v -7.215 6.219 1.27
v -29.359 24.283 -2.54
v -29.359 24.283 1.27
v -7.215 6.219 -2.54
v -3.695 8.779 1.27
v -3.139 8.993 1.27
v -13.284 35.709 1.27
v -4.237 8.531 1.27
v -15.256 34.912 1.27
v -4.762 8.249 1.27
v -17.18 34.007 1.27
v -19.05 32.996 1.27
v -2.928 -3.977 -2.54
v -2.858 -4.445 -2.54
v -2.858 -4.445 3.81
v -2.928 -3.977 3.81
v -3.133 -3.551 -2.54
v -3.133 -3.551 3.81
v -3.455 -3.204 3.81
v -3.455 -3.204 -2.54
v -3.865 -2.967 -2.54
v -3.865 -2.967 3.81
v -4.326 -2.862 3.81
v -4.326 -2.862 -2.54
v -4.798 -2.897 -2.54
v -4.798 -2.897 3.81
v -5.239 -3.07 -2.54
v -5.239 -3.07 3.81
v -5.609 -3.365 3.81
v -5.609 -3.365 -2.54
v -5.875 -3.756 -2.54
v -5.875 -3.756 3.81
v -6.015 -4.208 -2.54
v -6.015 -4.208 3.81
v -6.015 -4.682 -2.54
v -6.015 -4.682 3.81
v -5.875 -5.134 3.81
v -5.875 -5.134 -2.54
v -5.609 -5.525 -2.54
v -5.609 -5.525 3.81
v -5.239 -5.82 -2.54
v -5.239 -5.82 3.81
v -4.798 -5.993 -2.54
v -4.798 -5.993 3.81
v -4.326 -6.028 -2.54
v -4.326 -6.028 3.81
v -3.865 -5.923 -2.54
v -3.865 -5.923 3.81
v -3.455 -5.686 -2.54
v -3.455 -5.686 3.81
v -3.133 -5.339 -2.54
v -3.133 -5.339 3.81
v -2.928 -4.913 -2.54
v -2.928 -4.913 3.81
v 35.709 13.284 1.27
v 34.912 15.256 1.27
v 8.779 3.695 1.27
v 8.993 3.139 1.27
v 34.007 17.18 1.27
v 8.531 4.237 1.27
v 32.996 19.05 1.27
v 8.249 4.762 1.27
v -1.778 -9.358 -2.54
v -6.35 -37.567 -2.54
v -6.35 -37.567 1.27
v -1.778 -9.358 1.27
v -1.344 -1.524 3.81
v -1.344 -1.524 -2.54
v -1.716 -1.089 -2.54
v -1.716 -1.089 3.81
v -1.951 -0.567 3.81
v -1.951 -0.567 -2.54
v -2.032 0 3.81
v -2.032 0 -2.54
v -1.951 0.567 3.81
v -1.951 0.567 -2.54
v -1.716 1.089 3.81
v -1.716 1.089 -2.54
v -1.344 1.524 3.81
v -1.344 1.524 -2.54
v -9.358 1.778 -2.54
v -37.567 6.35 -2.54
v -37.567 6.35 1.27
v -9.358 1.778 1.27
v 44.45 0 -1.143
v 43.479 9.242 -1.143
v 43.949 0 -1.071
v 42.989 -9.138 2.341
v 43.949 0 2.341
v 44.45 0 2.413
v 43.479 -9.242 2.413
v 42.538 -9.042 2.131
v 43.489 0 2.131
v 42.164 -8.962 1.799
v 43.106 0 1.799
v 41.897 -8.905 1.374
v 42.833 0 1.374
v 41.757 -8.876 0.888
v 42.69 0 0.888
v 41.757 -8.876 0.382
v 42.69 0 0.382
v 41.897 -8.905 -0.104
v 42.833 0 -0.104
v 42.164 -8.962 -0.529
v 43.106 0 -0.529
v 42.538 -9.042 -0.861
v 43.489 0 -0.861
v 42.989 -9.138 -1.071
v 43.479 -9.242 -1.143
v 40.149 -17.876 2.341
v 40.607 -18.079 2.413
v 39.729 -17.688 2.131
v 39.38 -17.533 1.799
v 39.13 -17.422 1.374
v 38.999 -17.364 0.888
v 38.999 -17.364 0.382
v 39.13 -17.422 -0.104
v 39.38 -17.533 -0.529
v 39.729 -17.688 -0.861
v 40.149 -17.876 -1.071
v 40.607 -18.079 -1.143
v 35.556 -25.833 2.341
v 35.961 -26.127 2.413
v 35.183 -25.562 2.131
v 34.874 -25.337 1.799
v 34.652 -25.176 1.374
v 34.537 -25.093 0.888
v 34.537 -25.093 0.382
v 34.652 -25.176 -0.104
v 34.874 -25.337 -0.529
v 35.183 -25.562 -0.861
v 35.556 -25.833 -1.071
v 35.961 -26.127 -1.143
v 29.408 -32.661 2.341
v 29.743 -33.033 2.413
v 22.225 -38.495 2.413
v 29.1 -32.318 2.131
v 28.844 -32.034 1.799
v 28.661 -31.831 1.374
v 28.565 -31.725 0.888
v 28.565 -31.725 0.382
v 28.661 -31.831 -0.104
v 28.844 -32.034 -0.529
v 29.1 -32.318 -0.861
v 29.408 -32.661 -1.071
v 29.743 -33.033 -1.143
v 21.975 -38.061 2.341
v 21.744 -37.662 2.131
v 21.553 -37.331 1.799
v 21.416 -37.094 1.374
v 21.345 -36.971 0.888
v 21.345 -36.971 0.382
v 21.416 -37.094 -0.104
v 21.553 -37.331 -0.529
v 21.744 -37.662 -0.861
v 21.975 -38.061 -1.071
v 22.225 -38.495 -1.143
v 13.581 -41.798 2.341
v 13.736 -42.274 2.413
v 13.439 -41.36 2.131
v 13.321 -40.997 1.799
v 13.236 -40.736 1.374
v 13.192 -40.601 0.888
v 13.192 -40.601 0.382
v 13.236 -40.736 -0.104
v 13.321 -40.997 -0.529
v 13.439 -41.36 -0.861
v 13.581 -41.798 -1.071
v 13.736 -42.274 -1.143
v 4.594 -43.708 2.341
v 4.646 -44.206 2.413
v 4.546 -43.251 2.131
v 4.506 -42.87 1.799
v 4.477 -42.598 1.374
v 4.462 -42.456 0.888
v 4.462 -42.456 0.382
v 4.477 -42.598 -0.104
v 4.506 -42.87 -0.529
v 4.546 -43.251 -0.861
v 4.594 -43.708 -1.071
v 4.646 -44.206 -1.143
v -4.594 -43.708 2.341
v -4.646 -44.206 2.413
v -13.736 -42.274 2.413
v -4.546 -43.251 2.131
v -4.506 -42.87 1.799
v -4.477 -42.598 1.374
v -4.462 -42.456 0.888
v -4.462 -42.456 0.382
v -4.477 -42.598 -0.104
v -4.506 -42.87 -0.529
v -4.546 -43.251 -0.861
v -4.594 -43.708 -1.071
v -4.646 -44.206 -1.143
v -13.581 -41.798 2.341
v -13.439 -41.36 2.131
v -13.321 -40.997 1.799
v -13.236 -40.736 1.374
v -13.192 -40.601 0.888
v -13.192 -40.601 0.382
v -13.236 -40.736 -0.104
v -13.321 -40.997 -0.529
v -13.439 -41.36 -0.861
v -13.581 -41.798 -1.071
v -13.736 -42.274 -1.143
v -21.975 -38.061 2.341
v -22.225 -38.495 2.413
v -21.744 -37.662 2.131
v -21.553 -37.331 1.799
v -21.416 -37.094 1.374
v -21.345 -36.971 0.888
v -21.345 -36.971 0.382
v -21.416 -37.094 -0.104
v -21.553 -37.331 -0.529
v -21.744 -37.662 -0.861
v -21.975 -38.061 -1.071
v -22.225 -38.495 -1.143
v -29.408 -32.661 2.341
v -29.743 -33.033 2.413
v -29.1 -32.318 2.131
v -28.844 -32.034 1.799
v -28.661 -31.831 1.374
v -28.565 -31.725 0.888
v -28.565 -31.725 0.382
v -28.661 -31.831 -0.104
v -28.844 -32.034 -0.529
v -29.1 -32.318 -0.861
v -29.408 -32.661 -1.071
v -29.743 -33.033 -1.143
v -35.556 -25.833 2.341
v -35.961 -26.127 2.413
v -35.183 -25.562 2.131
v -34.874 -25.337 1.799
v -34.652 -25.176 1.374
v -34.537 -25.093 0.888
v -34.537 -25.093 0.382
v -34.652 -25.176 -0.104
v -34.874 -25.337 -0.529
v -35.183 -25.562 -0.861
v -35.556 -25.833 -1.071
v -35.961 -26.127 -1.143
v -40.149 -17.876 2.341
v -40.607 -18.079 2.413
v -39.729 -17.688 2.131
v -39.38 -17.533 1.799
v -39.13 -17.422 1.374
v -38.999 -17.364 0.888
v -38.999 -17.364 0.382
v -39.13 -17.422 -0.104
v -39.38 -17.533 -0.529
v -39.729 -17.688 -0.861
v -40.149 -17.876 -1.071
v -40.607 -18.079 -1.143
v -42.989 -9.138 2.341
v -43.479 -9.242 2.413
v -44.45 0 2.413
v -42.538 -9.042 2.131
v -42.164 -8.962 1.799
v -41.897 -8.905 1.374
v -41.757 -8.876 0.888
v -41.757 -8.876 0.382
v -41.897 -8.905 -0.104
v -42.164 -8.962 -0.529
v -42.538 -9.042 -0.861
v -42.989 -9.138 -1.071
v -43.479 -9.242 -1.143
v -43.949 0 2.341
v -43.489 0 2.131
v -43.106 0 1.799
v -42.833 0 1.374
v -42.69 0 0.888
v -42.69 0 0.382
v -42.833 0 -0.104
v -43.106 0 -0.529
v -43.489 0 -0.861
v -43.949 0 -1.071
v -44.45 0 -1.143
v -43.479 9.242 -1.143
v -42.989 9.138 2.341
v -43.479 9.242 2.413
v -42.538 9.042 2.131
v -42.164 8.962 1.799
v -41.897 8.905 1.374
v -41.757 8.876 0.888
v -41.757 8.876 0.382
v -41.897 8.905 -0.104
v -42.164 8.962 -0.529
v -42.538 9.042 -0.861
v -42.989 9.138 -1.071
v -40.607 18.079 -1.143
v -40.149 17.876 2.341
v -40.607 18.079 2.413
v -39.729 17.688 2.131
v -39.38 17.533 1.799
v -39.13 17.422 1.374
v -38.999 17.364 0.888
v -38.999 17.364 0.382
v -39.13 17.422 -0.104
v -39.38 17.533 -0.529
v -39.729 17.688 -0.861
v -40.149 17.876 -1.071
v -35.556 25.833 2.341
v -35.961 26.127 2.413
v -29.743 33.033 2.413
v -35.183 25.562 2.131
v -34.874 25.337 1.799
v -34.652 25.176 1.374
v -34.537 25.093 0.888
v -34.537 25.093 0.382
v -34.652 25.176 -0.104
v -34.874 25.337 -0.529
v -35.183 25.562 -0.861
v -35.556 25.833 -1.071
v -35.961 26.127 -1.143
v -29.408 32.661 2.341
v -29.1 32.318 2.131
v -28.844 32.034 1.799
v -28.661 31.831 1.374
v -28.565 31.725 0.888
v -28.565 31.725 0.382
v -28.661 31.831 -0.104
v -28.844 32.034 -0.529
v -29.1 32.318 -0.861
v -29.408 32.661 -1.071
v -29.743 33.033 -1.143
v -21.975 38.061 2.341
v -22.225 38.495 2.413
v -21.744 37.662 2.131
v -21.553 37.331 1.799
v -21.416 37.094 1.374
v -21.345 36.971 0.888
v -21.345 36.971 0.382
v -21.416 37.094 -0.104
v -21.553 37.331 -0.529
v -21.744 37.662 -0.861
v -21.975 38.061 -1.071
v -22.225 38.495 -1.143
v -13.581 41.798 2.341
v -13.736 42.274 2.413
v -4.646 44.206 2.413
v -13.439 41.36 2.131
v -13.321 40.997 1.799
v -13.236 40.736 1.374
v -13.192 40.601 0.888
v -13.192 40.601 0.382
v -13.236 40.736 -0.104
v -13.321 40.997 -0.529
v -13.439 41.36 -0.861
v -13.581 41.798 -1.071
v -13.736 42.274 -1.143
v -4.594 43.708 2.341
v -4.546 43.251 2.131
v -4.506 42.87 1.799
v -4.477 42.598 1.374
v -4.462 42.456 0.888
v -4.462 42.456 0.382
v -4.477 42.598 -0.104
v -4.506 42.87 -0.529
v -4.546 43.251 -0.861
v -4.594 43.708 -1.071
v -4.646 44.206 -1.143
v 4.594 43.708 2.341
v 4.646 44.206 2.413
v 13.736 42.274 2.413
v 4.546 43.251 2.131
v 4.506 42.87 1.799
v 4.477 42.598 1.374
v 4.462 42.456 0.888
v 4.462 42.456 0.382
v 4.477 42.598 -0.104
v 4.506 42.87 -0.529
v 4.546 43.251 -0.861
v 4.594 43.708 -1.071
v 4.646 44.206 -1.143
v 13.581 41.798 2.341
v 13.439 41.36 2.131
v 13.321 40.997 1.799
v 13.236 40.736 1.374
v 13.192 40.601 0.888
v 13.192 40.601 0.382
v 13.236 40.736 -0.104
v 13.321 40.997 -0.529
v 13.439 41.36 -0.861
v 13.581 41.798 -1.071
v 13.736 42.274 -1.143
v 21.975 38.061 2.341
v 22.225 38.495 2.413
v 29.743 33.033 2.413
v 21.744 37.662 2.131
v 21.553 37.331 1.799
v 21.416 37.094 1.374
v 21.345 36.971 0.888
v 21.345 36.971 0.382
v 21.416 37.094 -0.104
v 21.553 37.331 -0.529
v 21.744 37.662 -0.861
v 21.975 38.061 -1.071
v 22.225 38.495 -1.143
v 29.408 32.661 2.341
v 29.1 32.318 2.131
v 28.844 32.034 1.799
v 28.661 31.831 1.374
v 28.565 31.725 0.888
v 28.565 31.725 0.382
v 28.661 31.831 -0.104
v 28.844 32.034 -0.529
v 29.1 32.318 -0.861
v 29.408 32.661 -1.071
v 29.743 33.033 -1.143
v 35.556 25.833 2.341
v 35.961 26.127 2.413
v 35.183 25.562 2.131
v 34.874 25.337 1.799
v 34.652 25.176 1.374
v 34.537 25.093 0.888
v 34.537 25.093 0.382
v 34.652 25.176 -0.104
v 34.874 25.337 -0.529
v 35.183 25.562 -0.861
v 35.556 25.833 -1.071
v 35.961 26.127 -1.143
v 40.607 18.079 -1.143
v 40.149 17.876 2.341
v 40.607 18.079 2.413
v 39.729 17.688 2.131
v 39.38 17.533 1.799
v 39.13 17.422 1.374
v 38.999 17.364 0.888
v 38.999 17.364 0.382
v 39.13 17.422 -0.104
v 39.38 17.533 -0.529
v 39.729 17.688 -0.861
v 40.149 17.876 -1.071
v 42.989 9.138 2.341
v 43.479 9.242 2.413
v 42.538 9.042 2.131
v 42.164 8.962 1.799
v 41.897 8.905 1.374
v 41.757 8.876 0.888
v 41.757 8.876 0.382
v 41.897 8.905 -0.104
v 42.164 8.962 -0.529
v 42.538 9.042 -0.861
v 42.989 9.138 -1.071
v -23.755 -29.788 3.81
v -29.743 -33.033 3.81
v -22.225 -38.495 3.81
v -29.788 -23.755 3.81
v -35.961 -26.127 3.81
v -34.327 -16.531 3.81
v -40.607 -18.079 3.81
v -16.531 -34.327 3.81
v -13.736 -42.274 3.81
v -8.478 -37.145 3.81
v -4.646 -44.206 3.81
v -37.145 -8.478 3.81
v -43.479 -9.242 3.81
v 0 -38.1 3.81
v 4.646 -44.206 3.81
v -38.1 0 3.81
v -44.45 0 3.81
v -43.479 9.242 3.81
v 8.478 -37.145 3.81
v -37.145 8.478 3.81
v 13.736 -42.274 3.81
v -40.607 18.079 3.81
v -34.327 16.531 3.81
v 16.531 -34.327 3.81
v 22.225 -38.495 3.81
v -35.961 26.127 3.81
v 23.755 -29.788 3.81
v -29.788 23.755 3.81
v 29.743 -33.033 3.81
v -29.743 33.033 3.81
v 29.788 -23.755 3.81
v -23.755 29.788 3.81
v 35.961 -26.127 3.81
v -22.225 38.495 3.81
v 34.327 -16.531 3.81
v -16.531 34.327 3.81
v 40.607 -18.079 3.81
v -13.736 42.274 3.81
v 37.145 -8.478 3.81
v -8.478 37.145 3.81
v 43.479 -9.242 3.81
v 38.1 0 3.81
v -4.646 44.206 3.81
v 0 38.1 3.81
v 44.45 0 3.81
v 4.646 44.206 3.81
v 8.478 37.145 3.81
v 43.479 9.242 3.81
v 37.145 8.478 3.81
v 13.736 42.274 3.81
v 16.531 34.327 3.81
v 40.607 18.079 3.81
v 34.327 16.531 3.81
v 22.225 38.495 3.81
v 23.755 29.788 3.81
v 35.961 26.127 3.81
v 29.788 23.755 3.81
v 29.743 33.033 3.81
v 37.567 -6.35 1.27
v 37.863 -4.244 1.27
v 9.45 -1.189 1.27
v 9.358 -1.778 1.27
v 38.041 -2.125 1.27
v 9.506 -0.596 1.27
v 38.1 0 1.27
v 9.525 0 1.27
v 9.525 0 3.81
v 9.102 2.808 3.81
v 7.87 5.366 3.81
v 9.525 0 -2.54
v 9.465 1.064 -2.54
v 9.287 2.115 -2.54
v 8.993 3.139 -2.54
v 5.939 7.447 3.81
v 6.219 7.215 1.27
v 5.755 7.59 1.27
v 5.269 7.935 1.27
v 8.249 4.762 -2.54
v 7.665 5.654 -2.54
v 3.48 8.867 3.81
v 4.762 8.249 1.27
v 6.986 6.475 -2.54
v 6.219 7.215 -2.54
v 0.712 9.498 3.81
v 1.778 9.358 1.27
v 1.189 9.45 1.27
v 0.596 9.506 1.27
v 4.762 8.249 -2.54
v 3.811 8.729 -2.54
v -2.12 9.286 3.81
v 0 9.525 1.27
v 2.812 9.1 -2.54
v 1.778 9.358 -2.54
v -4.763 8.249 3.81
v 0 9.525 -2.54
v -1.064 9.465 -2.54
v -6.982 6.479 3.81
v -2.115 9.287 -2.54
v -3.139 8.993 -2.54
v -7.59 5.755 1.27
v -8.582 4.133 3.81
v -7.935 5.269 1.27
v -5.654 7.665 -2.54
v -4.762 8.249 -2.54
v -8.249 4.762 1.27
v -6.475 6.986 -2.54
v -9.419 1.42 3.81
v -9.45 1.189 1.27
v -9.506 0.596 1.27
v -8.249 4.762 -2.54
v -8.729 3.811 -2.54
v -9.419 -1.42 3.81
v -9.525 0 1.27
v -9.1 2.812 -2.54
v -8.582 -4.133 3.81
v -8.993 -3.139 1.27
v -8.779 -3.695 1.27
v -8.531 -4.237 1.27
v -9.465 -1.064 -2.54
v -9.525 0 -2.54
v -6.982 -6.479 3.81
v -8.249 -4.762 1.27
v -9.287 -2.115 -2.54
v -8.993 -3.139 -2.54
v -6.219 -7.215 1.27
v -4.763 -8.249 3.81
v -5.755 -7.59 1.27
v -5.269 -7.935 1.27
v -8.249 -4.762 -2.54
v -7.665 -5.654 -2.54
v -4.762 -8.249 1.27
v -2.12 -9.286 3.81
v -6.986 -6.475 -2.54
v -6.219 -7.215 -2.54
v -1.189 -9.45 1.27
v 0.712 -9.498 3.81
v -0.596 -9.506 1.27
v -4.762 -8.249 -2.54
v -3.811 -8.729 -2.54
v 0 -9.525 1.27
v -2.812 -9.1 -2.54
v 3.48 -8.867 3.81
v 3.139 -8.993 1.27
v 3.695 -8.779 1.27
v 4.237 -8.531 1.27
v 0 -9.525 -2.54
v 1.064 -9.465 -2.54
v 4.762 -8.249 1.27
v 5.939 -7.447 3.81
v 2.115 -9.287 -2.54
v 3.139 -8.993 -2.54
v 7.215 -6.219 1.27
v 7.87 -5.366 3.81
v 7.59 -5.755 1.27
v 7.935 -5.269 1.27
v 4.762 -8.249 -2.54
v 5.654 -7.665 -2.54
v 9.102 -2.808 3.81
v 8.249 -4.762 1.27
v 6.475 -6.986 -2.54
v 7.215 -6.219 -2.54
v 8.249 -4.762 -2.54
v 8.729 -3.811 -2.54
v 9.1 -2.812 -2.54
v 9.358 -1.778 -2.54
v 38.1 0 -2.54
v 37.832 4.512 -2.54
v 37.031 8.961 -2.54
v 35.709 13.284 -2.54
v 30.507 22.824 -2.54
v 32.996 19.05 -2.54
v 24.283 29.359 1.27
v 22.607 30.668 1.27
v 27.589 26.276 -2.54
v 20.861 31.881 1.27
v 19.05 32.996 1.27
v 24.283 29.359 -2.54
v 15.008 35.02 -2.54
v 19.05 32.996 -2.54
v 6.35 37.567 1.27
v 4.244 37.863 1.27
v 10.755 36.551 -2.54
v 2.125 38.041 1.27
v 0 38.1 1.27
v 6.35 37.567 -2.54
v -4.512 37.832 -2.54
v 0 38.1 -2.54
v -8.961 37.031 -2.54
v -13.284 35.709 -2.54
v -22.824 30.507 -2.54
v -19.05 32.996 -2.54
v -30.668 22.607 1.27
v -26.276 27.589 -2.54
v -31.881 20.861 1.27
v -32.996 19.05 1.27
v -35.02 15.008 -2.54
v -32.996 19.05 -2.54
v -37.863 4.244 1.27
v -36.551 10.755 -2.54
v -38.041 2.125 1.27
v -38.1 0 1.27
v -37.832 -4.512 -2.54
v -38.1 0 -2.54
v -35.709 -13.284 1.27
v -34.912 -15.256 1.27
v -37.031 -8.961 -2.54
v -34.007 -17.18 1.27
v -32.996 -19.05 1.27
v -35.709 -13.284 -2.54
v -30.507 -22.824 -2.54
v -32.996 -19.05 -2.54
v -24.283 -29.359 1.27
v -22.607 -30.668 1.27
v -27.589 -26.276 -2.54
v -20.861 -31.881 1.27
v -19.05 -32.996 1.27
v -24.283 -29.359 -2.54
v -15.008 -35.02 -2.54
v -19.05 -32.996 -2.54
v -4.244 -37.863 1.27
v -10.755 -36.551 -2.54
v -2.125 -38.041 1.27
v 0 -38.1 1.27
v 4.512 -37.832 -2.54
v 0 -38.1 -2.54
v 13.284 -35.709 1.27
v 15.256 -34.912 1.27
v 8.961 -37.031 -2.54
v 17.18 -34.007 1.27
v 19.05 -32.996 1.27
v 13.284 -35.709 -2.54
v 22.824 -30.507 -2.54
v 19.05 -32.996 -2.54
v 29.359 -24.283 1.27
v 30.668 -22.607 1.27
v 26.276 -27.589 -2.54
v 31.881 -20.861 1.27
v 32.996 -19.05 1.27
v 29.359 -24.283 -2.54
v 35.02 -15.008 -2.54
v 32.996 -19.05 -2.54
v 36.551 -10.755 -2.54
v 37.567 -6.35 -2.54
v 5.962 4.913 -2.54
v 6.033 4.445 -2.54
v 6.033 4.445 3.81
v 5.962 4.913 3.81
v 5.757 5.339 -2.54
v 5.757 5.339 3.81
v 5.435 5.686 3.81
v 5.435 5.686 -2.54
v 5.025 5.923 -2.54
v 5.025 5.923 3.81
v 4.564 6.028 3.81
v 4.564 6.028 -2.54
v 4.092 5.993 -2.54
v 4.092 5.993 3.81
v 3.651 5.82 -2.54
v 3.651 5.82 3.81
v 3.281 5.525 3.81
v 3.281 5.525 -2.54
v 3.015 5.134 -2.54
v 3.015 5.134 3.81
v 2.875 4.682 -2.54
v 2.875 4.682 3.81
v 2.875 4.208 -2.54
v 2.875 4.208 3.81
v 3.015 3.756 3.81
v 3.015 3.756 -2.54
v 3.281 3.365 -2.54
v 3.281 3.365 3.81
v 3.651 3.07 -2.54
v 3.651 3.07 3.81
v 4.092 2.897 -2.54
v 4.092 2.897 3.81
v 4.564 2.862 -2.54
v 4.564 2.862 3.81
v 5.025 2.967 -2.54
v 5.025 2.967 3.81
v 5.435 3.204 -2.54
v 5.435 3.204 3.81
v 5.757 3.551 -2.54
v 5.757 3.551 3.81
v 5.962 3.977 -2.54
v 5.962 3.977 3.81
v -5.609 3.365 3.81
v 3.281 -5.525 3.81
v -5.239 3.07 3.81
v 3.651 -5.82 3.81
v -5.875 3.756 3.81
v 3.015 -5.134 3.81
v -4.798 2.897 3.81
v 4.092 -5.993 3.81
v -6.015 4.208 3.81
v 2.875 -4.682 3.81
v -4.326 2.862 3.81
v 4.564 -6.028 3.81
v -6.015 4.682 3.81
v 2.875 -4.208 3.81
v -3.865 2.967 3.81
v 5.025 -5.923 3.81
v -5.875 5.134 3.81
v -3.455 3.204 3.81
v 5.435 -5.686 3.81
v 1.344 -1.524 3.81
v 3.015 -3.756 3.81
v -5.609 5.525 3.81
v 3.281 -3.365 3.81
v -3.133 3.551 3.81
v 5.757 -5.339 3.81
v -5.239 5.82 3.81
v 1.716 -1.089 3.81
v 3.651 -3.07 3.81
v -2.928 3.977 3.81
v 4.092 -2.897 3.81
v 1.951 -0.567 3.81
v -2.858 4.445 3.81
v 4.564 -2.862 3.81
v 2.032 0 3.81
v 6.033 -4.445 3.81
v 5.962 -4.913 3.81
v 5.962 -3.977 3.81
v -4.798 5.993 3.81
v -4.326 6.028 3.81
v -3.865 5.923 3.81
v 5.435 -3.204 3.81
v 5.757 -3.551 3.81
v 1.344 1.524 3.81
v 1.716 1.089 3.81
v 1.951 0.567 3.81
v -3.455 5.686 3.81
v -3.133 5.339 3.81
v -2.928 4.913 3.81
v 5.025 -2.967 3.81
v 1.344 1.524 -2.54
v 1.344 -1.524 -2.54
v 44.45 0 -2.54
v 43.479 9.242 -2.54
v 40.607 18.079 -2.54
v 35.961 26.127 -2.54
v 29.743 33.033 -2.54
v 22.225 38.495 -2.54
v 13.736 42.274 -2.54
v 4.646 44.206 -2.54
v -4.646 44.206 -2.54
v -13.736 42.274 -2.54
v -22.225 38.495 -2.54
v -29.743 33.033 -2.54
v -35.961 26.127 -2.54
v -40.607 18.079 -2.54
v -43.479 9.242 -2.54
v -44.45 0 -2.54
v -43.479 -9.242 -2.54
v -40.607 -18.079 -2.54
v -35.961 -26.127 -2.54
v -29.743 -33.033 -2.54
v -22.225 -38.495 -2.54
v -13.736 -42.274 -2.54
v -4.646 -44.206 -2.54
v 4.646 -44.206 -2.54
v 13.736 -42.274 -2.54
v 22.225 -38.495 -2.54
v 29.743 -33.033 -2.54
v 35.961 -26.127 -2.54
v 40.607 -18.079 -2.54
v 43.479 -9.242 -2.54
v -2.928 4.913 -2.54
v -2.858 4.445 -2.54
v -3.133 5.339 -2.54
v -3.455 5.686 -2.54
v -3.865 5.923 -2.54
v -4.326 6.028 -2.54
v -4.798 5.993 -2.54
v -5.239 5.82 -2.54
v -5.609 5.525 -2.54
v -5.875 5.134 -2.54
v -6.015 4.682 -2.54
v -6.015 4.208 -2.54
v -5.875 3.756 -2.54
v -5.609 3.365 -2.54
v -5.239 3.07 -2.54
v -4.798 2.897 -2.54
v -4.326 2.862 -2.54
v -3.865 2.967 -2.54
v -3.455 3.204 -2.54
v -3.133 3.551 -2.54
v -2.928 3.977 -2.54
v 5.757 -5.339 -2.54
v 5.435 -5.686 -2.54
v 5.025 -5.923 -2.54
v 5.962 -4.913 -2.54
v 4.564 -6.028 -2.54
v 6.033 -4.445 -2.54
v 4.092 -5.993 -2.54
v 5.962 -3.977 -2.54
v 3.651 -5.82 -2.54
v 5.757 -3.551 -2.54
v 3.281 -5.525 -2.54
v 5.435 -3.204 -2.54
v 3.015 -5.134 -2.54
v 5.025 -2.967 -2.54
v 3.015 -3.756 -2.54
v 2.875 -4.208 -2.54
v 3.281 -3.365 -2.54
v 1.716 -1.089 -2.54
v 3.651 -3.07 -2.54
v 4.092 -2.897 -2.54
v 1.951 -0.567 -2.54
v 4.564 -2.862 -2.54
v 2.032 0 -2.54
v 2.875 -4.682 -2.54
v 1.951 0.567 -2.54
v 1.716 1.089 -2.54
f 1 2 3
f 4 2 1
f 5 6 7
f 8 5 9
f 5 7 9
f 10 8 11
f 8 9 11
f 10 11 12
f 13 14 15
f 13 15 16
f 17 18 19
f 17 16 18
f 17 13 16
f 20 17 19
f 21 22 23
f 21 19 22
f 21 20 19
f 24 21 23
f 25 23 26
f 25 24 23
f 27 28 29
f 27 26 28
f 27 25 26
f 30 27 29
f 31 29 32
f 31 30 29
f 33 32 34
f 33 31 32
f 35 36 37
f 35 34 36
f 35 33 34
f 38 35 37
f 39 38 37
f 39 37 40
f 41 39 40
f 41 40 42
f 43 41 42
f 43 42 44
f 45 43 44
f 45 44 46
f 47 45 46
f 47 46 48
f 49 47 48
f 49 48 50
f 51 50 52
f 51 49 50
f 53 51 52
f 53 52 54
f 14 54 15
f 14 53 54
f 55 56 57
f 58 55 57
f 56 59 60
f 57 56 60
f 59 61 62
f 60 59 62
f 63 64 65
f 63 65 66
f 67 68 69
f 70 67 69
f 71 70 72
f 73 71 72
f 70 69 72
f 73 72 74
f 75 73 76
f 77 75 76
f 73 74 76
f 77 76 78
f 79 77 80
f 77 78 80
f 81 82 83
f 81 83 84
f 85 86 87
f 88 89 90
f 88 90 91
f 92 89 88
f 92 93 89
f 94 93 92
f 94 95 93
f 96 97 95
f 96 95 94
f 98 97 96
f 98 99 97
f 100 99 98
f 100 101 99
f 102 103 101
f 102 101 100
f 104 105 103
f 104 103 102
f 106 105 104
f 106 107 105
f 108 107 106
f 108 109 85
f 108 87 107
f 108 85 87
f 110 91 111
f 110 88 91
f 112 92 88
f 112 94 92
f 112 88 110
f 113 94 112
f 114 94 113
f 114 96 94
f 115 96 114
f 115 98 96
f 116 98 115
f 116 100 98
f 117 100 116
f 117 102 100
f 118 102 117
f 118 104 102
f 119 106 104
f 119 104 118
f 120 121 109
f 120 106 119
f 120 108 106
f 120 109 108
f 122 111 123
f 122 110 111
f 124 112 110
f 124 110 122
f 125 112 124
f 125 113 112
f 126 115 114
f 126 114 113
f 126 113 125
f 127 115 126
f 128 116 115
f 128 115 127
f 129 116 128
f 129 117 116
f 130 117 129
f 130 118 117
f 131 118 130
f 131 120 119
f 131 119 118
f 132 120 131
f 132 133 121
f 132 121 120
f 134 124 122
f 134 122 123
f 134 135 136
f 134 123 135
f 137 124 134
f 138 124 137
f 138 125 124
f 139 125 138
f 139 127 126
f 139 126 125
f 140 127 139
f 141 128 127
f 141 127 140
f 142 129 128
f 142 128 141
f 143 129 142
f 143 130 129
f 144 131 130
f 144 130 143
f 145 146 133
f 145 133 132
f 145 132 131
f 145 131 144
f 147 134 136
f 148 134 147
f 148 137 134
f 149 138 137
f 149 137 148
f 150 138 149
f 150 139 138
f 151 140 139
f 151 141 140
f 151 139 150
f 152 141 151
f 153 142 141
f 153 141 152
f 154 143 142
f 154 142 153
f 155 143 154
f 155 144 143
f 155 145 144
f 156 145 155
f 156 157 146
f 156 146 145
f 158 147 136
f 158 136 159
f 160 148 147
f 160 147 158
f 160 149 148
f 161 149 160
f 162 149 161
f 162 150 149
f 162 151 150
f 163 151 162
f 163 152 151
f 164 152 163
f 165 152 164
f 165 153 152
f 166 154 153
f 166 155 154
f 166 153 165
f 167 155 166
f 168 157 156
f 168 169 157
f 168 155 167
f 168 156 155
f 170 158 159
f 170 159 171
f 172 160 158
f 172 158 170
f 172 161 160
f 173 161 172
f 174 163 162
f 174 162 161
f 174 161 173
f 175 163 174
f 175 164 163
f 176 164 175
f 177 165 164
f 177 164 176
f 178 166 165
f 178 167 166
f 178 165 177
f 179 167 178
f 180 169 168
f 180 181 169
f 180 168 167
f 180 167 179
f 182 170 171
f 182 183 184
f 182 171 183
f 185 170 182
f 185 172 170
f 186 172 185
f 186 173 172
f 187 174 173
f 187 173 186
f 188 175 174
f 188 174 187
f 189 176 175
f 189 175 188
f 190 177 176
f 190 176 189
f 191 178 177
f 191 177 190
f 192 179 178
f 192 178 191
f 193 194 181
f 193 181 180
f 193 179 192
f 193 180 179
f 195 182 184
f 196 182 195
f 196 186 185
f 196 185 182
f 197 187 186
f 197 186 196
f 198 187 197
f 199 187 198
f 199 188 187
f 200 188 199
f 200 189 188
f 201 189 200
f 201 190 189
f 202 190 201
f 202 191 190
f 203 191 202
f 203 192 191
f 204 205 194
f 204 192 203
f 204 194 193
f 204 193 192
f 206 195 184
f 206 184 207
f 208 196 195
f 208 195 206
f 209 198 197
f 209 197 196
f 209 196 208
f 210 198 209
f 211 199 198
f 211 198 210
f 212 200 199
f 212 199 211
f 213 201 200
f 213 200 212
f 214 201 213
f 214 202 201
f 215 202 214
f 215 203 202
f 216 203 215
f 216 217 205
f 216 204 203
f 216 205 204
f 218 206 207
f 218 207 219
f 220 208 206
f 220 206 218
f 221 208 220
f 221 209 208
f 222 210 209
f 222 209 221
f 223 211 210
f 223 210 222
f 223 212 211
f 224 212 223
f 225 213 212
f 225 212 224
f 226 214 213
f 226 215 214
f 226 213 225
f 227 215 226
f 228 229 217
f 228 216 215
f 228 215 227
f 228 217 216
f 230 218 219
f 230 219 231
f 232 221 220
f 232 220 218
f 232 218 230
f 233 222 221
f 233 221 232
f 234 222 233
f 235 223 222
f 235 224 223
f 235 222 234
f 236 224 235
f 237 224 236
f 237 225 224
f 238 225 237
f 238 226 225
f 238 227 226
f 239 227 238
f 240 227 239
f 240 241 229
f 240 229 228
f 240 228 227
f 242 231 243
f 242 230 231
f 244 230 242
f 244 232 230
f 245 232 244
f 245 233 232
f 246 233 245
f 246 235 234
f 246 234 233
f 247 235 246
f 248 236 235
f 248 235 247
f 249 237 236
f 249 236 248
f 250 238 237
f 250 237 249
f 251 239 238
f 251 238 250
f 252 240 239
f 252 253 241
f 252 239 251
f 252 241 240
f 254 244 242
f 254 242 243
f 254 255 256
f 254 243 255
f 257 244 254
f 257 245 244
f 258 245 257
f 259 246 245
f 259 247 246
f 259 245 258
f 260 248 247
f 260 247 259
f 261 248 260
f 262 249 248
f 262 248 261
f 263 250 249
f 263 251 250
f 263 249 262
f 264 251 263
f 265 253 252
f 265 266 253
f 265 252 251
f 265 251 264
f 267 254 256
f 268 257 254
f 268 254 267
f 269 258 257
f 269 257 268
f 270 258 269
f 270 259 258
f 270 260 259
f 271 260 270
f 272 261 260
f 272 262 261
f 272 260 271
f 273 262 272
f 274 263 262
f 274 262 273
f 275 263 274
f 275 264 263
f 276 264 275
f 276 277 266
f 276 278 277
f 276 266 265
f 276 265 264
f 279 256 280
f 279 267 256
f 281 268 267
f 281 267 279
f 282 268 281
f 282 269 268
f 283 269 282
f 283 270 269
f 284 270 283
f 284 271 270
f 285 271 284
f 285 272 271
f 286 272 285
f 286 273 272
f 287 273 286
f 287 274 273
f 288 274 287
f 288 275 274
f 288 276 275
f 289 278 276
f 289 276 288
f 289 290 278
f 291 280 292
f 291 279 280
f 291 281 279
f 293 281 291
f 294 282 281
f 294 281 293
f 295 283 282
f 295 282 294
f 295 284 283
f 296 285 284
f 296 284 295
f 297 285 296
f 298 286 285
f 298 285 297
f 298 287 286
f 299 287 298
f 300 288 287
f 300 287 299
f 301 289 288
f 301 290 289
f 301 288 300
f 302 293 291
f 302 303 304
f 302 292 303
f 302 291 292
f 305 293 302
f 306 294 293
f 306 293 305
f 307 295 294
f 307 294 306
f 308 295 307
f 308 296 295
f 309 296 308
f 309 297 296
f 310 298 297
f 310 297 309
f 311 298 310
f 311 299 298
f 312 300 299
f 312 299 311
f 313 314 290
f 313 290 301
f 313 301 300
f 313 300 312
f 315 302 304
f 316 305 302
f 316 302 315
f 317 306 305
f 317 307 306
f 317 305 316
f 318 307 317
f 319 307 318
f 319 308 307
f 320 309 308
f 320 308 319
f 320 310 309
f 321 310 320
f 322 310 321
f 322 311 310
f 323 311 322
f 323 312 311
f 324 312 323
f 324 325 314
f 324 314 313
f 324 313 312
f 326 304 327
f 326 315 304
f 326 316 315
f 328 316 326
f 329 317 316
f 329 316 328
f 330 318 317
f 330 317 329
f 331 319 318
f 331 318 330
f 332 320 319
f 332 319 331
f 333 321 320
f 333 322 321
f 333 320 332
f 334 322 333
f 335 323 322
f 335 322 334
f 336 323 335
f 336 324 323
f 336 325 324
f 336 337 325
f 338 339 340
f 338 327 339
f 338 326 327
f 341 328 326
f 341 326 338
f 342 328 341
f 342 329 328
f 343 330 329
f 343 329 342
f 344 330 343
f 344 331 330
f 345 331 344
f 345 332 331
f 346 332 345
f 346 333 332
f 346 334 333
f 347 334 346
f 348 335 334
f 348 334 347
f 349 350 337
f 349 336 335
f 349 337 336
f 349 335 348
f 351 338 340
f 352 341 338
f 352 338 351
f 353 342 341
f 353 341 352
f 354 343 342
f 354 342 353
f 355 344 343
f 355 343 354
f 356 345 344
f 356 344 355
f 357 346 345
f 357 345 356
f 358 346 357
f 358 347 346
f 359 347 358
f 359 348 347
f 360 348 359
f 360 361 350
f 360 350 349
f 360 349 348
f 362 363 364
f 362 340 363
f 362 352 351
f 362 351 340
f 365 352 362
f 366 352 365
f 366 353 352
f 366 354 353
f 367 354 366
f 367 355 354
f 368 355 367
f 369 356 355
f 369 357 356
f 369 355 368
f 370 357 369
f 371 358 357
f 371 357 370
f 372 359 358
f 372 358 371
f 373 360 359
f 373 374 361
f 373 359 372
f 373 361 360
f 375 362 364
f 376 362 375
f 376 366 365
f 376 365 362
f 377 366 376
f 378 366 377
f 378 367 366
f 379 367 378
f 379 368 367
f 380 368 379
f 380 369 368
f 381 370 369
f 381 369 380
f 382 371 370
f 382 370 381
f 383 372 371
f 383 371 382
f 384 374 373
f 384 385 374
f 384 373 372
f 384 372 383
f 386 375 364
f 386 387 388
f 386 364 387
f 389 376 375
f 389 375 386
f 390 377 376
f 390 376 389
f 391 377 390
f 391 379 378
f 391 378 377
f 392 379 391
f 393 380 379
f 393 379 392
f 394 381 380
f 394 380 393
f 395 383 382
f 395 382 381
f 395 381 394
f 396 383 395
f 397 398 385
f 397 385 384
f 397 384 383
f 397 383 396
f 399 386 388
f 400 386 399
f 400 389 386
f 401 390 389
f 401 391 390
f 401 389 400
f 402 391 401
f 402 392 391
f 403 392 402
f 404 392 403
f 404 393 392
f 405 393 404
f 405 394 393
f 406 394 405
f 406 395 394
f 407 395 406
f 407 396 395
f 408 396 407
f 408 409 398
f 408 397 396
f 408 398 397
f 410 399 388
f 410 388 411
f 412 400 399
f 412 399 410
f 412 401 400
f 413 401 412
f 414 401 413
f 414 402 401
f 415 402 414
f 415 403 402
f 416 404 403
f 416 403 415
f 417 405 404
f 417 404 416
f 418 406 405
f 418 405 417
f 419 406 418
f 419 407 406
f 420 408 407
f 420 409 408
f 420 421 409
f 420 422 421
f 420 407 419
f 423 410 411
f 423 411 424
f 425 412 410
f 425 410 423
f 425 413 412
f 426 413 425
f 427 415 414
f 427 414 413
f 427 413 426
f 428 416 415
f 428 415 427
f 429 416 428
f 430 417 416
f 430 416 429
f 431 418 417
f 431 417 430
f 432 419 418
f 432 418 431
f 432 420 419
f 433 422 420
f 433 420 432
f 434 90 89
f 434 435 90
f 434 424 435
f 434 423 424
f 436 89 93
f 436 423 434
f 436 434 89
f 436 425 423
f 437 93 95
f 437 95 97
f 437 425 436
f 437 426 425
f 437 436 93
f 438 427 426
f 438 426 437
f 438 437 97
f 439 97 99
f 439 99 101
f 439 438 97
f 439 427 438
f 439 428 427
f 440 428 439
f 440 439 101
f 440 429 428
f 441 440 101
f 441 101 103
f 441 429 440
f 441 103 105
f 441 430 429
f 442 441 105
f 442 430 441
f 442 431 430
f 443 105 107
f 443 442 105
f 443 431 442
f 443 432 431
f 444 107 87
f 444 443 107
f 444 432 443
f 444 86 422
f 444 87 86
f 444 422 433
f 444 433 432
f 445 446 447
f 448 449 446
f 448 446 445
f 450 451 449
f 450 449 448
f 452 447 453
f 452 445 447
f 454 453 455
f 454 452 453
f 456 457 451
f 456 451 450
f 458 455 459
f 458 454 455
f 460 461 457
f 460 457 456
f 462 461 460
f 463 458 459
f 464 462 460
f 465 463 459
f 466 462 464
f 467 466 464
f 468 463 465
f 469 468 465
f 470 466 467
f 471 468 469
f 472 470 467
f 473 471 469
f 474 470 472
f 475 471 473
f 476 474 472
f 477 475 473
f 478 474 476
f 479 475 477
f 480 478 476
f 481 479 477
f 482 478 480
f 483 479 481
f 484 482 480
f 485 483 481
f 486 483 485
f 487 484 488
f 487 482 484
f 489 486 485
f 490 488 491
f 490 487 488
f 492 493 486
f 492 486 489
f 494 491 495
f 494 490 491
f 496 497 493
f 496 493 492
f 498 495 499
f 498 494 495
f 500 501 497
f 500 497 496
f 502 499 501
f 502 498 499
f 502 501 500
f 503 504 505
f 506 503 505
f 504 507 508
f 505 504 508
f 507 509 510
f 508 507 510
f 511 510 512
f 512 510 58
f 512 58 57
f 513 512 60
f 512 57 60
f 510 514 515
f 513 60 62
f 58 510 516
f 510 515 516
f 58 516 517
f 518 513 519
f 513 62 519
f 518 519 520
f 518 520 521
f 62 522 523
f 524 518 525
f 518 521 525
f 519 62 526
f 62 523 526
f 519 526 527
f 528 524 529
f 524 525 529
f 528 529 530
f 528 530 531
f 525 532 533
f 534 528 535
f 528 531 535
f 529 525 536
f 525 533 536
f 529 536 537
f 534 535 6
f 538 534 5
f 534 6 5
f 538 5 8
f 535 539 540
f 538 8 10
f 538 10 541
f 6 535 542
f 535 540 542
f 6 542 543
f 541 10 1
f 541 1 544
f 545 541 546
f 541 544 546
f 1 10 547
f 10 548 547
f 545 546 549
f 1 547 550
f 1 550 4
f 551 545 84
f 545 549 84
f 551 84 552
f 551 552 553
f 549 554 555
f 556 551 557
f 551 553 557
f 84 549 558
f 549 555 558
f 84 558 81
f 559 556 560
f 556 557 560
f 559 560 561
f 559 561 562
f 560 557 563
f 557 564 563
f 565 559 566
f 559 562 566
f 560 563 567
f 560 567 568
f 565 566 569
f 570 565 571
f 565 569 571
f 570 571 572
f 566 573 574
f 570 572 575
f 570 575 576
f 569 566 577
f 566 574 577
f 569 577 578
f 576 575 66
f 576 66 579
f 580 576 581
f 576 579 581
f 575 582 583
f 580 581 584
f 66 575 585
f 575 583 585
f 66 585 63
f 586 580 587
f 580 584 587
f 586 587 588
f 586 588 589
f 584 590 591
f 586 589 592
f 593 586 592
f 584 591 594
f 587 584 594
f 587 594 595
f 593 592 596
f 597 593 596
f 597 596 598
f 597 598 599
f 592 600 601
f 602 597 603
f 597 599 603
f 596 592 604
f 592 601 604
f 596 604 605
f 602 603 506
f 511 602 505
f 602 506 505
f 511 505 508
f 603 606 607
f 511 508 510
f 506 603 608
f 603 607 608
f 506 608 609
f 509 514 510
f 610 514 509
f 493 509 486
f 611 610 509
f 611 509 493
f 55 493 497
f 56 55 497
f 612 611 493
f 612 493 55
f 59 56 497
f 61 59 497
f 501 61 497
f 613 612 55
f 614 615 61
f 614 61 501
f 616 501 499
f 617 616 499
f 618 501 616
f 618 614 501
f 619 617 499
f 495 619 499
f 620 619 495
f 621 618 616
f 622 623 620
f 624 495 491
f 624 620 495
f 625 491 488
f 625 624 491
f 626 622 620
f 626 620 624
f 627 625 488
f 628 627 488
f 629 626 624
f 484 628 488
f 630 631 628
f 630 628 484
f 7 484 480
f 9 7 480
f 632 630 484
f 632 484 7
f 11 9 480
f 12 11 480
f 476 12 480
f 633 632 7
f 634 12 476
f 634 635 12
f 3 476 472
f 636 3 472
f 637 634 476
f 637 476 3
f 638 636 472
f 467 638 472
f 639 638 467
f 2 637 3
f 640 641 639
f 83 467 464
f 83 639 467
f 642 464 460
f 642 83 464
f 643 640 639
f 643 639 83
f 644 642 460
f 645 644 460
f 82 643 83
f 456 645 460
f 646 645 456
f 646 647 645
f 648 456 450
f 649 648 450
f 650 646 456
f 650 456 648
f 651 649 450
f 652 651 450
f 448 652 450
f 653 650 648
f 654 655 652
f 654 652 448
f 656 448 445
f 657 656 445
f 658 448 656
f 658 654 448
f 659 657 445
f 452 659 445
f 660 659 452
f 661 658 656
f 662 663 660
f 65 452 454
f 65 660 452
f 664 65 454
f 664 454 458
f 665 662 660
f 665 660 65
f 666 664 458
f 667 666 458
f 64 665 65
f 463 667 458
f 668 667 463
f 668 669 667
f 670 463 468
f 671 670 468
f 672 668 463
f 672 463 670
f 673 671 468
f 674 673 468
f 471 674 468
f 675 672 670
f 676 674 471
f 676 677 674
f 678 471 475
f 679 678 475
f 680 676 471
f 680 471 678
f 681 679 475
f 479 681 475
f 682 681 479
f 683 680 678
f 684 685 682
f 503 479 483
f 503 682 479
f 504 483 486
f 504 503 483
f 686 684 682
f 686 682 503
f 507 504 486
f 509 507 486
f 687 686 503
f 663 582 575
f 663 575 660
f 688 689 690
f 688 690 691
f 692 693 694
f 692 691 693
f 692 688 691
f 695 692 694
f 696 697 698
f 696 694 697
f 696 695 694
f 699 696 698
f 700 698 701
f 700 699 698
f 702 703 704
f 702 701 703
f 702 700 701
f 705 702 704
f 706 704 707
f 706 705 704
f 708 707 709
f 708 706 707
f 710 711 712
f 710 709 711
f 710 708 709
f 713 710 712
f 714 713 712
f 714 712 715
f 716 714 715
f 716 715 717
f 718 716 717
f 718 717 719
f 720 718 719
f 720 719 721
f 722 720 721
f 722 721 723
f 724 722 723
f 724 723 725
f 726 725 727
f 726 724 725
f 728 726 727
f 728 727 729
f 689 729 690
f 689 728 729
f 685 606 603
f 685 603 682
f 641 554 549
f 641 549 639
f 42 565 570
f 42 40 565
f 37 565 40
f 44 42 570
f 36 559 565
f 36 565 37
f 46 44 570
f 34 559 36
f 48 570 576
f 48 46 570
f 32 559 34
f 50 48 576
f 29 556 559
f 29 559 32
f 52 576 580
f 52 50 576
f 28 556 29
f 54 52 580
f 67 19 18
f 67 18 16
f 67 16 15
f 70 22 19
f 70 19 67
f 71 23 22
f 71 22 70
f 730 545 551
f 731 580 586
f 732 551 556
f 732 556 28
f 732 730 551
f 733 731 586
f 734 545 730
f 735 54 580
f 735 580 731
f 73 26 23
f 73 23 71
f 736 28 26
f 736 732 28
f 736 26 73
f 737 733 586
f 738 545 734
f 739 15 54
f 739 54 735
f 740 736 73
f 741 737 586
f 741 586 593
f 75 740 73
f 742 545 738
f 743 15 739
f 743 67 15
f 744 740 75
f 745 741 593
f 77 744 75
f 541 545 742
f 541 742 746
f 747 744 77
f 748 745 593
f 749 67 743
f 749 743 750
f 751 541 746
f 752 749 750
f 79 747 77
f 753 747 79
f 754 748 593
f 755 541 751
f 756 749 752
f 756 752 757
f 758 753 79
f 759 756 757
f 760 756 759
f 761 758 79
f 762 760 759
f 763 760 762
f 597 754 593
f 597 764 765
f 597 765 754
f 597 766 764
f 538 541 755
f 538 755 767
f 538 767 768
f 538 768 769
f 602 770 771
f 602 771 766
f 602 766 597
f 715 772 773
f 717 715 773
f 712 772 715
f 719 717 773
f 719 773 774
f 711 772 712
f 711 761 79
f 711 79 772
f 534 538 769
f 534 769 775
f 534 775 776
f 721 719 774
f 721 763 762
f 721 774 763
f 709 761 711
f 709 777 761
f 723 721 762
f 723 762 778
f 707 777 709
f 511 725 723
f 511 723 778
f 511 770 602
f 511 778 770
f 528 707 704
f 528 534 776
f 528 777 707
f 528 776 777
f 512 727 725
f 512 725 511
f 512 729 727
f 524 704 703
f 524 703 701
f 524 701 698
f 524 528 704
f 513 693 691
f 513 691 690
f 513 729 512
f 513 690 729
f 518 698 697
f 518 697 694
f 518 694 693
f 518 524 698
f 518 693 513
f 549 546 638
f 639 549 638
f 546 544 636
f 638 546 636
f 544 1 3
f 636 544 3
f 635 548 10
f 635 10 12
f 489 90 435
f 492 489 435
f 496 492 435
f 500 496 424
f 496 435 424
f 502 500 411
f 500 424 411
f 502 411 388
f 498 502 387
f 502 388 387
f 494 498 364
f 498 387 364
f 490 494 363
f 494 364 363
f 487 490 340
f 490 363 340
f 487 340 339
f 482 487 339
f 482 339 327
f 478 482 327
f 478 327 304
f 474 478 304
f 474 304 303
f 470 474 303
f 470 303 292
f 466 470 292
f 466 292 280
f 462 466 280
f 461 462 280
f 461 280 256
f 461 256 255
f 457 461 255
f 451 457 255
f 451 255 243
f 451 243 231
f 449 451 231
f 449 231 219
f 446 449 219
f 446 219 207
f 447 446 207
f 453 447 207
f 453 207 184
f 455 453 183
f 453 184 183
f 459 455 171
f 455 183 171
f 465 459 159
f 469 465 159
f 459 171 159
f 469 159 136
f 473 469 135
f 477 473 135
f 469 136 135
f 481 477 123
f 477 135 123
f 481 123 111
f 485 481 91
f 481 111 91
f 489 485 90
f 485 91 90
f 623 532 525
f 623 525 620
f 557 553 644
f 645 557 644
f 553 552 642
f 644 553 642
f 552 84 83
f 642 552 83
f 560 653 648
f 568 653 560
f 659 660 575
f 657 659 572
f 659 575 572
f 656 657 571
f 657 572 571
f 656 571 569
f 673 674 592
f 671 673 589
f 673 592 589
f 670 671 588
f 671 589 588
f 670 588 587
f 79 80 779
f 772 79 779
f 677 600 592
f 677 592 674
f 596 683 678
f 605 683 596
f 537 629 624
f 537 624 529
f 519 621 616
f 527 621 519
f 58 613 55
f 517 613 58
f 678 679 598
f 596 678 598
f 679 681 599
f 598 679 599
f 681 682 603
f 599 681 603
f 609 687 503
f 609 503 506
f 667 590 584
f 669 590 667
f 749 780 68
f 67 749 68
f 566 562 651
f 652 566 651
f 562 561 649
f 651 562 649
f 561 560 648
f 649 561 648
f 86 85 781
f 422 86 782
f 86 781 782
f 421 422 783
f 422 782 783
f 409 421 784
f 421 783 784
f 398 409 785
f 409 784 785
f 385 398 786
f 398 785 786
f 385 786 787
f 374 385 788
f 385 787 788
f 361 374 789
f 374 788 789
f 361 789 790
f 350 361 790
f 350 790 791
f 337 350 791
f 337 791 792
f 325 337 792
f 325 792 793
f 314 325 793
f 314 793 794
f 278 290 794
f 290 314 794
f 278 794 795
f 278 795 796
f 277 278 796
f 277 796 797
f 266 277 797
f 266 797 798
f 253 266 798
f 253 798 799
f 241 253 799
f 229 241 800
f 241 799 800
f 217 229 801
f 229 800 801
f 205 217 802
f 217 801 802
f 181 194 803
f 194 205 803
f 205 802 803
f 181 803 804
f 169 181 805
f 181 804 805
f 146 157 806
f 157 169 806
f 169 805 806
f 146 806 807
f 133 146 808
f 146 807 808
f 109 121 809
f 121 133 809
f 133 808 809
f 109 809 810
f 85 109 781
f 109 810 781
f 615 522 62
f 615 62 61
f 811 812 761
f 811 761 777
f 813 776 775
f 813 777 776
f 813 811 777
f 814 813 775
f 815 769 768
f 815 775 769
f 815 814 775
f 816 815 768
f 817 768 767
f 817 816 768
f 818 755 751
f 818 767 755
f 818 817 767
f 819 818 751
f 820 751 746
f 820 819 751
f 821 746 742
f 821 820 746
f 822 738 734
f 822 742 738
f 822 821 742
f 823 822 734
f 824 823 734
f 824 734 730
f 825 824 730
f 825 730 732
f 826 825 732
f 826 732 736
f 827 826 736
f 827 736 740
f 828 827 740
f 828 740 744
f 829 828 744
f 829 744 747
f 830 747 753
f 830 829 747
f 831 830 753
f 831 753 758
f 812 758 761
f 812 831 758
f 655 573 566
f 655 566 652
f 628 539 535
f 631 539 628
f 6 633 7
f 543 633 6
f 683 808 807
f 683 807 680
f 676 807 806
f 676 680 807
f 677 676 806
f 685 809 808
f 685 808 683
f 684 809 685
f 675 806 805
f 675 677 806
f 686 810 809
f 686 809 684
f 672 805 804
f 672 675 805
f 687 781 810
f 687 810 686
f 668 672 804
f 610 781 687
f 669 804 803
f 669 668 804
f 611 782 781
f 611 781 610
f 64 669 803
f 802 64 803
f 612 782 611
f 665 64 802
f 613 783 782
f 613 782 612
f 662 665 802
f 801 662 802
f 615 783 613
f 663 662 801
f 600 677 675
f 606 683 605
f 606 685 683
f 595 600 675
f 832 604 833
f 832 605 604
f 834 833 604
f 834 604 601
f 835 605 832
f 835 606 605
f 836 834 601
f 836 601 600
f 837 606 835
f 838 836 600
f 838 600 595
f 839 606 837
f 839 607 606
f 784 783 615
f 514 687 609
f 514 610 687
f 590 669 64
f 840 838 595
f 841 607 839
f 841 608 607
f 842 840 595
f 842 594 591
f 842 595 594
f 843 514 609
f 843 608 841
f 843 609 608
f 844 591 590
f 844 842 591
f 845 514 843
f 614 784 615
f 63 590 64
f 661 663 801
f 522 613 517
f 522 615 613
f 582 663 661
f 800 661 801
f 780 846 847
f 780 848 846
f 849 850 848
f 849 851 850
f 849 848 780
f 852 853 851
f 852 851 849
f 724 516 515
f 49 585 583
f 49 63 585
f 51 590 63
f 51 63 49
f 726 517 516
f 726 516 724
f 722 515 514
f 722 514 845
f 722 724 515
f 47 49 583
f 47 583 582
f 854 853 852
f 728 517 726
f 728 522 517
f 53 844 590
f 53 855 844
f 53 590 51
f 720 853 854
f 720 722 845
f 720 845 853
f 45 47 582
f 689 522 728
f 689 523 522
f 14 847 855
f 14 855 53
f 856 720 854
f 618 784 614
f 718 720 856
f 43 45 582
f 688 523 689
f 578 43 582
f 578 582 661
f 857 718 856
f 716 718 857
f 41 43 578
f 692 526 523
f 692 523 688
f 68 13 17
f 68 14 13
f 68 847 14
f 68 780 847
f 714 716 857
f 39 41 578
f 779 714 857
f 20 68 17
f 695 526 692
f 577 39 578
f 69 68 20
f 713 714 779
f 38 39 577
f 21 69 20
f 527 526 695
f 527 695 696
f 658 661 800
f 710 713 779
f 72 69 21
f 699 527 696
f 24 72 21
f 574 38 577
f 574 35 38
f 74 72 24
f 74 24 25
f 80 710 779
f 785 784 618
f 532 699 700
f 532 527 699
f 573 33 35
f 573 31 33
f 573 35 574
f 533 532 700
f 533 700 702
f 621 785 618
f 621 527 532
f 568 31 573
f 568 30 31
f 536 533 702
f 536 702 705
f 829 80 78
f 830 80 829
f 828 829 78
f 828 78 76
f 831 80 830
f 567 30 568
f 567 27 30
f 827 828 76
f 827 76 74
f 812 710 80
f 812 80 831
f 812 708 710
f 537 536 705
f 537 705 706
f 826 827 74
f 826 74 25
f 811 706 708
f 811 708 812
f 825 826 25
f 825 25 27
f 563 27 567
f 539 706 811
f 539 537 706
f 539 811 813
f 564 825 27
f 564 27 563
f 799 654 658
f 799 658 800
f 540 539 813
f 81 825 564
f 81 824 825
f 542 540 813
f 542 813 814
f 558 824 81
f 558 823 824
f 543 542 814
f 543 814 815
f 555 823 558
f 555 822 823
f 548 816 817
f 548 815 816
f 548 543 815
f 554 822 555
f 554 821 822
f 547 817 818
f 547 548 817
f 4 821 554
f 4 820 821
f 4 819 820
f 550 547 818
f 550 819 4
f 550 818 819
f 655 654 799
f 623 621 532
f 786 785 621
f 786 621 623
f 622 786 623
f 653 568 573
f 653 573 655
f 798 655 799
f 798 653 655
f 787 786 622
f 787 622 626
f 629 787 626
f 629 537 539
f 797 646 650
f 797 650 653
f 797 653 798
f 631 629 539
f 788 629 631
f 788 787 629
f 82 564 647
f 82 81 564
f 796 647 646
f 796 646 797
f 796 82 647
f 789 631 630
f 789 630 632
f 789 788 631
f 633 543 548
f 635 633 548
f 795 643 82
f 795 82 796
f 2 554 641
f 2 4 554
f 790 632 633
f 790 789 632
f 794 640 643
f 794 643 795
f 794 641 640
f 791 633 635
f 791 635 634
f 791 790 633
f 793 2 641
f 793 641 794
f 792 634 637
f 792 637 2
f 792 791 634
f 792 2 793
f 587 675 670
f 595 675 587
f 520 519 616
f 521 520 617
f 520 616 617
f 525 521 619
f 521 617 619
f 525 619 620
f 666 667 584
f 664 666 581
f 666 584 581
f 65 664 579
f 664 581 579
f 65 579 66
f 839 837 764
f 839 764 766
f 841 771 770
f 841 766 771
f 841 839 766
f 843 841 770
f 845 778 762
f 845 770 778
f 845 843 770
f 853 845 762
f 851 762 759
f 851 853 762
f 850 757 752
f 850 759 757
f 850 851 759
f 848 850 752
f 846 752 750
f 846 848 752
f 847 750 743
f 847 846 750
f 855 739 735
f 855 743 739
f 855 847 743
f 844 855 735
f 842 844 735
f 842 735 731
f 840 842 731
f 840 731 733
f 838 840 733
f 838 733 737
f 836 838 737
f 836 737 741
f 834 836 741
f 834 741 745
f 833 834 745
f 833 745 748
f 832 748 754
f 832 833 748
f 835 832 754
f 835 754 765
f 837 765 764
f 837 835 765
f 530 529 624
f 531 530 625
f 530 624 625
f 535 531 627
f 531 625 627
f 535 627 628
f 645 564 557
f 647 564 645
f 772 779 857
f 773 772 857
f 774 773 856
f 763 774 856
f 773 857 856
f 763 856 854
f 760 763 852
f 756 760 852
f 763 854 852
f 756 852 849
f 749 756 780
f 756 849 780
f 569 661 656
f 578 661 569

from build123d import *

# Parameters (mm, degrees)
BOSS_EXTRUDE1_DEPTH        = 3.81
BOSS_EXTRUDE1_DEPTH_BACK   = 2.54
SKETCH1_R                  = 44.45
SKETCH1_R_2                = 38.1
BOSS_EXTRUDE1_2_DEPTH      = 3.81
BOSS_EXTRUDE1_2_DEPTH_BACK = 2.54
SKETCH1_R_3                = 9.525
BOSS_EXTRUDE2_DEPTH        = 1.27
BOSS_EXTRUDE2_DEPTH_BACK   = 2.54
CUT_EXTRUDE1_DEPTH         = 5.08
CUT_EXTRUDE1_DEPTH_BACK    = 5.08
SKETCH4_R                  = 1.5875
SKETCH6_R                  = 1.778


with BuildPart() as part:
    # Sketch1 → Boss-Extrude1 (new, two sides: drawn at the far end of the back side and taken through both)
    with BuildSketch(Plane.XY.offset(-BOSS_EXTRUDE1_DEPTH_BACK)):
        Circle(SKETCH1_R)
        Circle(SKETCH1_R_2, mode=Mode.SUBTRACT)
    extrude(amount=BOSS_EXTRUDE1_DEPTH + BOSS_EXTRUDE1_DEPTH_BACK)



with BuildPart() as body_2:
    # Sketch1 → Boss-Extrude1 2 (new, two sides: drawn at the far end of the back side and taken through both)
    with BuildSketch(Plane.XY.offset(-BOSS_EXTRUDE1_2_DEPTH_BACK)):
        Circle(SKETCH1_R_3)
        with BuildLine():
            Line((-1.344041666, 1.524), (1.344041666, 1.524))
            ThreePointArc((1.344041666, 1.524), (2.032, 0), (1.344041666, -1.524))
            Line((1.344041666, -1.524), (-1.344041666, -1.524))
            ThreePointArc((-1.344041666, -1.524), (-2.032, 0), (-1.344041666, 1.524))
        make_face(mode=Mode.SUBTRACT)
    extrude(amount=BOSS_EXTRUDE1_2_DEPTH + BOSS_EXTRUDE1_2_DEPTH_BACK)


with BuildPart() as part_1:
    add(part.part)

    add(body_2.part)  # Boss-Extrude2 merges body 2
    # Sketch2 → Boss-Extrude2 (add, two sides: drawn at the far end of the back side and taken through both)
    with BuildSketch(Plane.XY.offset(-BOSS_EXTRUDE2_DEPTH_BACK)):
        with BuildLine():
            Line((0, 9.525), (0, 38.1))
            ThreePointArc((0, 38.1), (3.186160517, 37.966542918), (6.35, 37.567106623))
            Line((6.35, 37.567106623), (1.778, 9.357582006))
            Line((1.778, 9.357582006), (0, 9.525))
        make_face()
        with BuildLine():
            Line((4.7625, 8.248891971), (19.05, 32.995567884))
            ThreePointArc((19.05, 32.995567884), (21.742567407, 31.286910403), (24.282814625, 29.359068682))
            Line((24.282814625, 29.359068682), (6.218584171, 7.214903735))
            Line((6.218584171, 7.214903735), (4.7625, 8.248891971))
        make_face()
        with BuildLine():
            Line((8.248891971, 4.7625), (32.995567884, 19.05))
            ThreePointArc((32.995567884, 19.05), (34.473070919, 16.223975511), (35.709068682, 13.284291997))
            Line((35.709068682, 13.284291997), (8.992903735, 3.138997835))
            Line((8.992903735, 3.138997835), (8.248891971, 4.7625))
        make_face()
        with BuildLine():
            Line((9.525, 0), (38.1, 0))
            ThreePointArc((38.1, 0), (37.966542918, -3.186160517), (37.567106623, -6.35))
            Line((37.567106623, -6.35), (9.357582006, -1.778))
            Line((9.357582006, -1.778), (9.525, 0))
        make_face()
        with BuildLine():
            Line((8.248891971, -4.7625), (32.995567884, -19.05))
            ThreePointArc((32.995567884, -19.05), (31.286910403, -21.742567407), (29.359068682, -24.282814625))
            Line((29.359068682, -24.282814625), (7.214903735, -6.218584171))
            Line((7.214903735, -6.218584171), (8.248891971, -4.7625))
        make_face()
        with BuildLine():
            Line((4.7625, -8.248891971), (19.05, -32.995567884))
            ThreePointArc((19.05, -32.995567884), (16.223975511, -34.473070919), (13.284291997, -35.709068682))
            Line((13.284291997, -35.709068682), (3.138997835, -8.992903735))
            Line((3.138997835, -8.992903735), (4.7625, -8.248891971))
        make_face()
        with BuildLine():
            Line((0, -9.525), (0, -38.1))
            ThreePointArc((0, -38.1), (-3.186160517, -37.966542918), (-6.35, -37.567106623))
            Line((-6.35, -37.567106623), (-1.778, -9.357582006))
            Line((-1.778, -9.357582006), (0, -9.525))
        make_face()
        with BuildLine():
            Line((-4.7625, -8.248891971), (-19.05, -32.995567884))
            ThreePointArc((-19.05, -32.995567884), (-21.742567407, -31.286910403), (-24.282814625, -29.359068682))
            Line((-24.282814625, -29.359068682), (-6.218584171, -7.214903735))
            Line((-6.218584171, -7.214903735), (-4.7625, -8.248891971))
        make_face()
        with BuildLine():
            Line((-8.248891971, -4.7625), (-32.995567884, -19.05))
            ThreePointArc((-32.995567884, -19.05), (-34.473070919, -16.223975511), (-35.709068682, -13.284291997))
            Line((-35.709068682, -13.284291997), (-8.992903735, -3.138997835))
            Line((-8.992903735, -3.138997835), (-8.248891971, -4.7625))
        make_face()
        with BuildLine():
            Line((-9.525, 0), (-38.1, 0))
            ThreePointArc((-38.1, 0), (-37.966542918, 3.186160517), (-37.567106623, 6.35))
            Line((-37.567106623, 6.35), (-9.357582006, 1.778))
            Line((-9.357582006, 1.778), (-9.525, 0))
        make_face()
        with BuildLine():
            Line((-8.248891971, 4.7625), (-32.995567884, 19.05))
            ThreePointArc((-32.995567884, 19.05), (-31.286910403, 21.742567407), (-29.359068682, 24.282814625))
            Line((-29.359068682, 24.282814625), (-7.214903735, 6.218584171))
            Line((-7.214903735, 6.218584171), (-8.248891971, 4.7625))
        make_face()
        with BuildLine():
            Line((-4.7625, 8.248891971), (-19.05, 32.995567884))
            ThreePointArc((-19.05, 32.995567884), (-16.223975511, 34.473070919), (-13.284291997, 35.709068682))
            Line((-13.284291997, 35.709068682), (-3.138997835, 8.992903735))
            Line((-3.138997835, 8.992903735), (-4.7625, 8.248891971))
        make_face()
    extrude(amount=BOSS_EXTRUDE2_DEPTH + BOSS_EXTRUDE2_DEPTH_BACK)

    # Sketch4 → Cut-Extrude1 (cut, two sides: drawn at the far end of the back side and taken through both)
    with BuildSketch(Plane.XY.offset(-CUT_EXTRUDE1_DEPTH_BACK)):
        with Locations((-4.445, 4.445)):
            Circle(SKETCH4_R)
        with Locations((4.445, 4.445)):
            Circle(SKETCH4_R)
        with Locations((4.445, -4.445)):
            Circle(SKETCH4_R)
        with Locations((-4.445, -4.445)):
            Circle(SKETCH4_R)
    extrude(amount=CUT_EXTRUDE1_DEPTH + CUT_EXTRUDE1_DEPTH_BACK, mode=Mode.SUBTRACT)

    # Sketch6 → Cut-Revolve1 (revolve, cut)
    with BuildSketch(Plane(origin=(0, 0, 0), x_dir=(0, 0, -1), z_dir=(1, 0, 0)), mode=Mode.PRIVATE) as cut_revolve1_sk:
        with Locations((-0.635, 44.45)):
            Circle(SKETCH6_R)
    revolve(cut_revolve1_sk.sketch.rotate(Axis((0, 0, 17.923706186), (0, 0, -1)), 90), axis=Axis((0, 0, 17.923706186), (0, 0, -1)), mode=Mode.SUBTRACT)


solid = part_1.part
